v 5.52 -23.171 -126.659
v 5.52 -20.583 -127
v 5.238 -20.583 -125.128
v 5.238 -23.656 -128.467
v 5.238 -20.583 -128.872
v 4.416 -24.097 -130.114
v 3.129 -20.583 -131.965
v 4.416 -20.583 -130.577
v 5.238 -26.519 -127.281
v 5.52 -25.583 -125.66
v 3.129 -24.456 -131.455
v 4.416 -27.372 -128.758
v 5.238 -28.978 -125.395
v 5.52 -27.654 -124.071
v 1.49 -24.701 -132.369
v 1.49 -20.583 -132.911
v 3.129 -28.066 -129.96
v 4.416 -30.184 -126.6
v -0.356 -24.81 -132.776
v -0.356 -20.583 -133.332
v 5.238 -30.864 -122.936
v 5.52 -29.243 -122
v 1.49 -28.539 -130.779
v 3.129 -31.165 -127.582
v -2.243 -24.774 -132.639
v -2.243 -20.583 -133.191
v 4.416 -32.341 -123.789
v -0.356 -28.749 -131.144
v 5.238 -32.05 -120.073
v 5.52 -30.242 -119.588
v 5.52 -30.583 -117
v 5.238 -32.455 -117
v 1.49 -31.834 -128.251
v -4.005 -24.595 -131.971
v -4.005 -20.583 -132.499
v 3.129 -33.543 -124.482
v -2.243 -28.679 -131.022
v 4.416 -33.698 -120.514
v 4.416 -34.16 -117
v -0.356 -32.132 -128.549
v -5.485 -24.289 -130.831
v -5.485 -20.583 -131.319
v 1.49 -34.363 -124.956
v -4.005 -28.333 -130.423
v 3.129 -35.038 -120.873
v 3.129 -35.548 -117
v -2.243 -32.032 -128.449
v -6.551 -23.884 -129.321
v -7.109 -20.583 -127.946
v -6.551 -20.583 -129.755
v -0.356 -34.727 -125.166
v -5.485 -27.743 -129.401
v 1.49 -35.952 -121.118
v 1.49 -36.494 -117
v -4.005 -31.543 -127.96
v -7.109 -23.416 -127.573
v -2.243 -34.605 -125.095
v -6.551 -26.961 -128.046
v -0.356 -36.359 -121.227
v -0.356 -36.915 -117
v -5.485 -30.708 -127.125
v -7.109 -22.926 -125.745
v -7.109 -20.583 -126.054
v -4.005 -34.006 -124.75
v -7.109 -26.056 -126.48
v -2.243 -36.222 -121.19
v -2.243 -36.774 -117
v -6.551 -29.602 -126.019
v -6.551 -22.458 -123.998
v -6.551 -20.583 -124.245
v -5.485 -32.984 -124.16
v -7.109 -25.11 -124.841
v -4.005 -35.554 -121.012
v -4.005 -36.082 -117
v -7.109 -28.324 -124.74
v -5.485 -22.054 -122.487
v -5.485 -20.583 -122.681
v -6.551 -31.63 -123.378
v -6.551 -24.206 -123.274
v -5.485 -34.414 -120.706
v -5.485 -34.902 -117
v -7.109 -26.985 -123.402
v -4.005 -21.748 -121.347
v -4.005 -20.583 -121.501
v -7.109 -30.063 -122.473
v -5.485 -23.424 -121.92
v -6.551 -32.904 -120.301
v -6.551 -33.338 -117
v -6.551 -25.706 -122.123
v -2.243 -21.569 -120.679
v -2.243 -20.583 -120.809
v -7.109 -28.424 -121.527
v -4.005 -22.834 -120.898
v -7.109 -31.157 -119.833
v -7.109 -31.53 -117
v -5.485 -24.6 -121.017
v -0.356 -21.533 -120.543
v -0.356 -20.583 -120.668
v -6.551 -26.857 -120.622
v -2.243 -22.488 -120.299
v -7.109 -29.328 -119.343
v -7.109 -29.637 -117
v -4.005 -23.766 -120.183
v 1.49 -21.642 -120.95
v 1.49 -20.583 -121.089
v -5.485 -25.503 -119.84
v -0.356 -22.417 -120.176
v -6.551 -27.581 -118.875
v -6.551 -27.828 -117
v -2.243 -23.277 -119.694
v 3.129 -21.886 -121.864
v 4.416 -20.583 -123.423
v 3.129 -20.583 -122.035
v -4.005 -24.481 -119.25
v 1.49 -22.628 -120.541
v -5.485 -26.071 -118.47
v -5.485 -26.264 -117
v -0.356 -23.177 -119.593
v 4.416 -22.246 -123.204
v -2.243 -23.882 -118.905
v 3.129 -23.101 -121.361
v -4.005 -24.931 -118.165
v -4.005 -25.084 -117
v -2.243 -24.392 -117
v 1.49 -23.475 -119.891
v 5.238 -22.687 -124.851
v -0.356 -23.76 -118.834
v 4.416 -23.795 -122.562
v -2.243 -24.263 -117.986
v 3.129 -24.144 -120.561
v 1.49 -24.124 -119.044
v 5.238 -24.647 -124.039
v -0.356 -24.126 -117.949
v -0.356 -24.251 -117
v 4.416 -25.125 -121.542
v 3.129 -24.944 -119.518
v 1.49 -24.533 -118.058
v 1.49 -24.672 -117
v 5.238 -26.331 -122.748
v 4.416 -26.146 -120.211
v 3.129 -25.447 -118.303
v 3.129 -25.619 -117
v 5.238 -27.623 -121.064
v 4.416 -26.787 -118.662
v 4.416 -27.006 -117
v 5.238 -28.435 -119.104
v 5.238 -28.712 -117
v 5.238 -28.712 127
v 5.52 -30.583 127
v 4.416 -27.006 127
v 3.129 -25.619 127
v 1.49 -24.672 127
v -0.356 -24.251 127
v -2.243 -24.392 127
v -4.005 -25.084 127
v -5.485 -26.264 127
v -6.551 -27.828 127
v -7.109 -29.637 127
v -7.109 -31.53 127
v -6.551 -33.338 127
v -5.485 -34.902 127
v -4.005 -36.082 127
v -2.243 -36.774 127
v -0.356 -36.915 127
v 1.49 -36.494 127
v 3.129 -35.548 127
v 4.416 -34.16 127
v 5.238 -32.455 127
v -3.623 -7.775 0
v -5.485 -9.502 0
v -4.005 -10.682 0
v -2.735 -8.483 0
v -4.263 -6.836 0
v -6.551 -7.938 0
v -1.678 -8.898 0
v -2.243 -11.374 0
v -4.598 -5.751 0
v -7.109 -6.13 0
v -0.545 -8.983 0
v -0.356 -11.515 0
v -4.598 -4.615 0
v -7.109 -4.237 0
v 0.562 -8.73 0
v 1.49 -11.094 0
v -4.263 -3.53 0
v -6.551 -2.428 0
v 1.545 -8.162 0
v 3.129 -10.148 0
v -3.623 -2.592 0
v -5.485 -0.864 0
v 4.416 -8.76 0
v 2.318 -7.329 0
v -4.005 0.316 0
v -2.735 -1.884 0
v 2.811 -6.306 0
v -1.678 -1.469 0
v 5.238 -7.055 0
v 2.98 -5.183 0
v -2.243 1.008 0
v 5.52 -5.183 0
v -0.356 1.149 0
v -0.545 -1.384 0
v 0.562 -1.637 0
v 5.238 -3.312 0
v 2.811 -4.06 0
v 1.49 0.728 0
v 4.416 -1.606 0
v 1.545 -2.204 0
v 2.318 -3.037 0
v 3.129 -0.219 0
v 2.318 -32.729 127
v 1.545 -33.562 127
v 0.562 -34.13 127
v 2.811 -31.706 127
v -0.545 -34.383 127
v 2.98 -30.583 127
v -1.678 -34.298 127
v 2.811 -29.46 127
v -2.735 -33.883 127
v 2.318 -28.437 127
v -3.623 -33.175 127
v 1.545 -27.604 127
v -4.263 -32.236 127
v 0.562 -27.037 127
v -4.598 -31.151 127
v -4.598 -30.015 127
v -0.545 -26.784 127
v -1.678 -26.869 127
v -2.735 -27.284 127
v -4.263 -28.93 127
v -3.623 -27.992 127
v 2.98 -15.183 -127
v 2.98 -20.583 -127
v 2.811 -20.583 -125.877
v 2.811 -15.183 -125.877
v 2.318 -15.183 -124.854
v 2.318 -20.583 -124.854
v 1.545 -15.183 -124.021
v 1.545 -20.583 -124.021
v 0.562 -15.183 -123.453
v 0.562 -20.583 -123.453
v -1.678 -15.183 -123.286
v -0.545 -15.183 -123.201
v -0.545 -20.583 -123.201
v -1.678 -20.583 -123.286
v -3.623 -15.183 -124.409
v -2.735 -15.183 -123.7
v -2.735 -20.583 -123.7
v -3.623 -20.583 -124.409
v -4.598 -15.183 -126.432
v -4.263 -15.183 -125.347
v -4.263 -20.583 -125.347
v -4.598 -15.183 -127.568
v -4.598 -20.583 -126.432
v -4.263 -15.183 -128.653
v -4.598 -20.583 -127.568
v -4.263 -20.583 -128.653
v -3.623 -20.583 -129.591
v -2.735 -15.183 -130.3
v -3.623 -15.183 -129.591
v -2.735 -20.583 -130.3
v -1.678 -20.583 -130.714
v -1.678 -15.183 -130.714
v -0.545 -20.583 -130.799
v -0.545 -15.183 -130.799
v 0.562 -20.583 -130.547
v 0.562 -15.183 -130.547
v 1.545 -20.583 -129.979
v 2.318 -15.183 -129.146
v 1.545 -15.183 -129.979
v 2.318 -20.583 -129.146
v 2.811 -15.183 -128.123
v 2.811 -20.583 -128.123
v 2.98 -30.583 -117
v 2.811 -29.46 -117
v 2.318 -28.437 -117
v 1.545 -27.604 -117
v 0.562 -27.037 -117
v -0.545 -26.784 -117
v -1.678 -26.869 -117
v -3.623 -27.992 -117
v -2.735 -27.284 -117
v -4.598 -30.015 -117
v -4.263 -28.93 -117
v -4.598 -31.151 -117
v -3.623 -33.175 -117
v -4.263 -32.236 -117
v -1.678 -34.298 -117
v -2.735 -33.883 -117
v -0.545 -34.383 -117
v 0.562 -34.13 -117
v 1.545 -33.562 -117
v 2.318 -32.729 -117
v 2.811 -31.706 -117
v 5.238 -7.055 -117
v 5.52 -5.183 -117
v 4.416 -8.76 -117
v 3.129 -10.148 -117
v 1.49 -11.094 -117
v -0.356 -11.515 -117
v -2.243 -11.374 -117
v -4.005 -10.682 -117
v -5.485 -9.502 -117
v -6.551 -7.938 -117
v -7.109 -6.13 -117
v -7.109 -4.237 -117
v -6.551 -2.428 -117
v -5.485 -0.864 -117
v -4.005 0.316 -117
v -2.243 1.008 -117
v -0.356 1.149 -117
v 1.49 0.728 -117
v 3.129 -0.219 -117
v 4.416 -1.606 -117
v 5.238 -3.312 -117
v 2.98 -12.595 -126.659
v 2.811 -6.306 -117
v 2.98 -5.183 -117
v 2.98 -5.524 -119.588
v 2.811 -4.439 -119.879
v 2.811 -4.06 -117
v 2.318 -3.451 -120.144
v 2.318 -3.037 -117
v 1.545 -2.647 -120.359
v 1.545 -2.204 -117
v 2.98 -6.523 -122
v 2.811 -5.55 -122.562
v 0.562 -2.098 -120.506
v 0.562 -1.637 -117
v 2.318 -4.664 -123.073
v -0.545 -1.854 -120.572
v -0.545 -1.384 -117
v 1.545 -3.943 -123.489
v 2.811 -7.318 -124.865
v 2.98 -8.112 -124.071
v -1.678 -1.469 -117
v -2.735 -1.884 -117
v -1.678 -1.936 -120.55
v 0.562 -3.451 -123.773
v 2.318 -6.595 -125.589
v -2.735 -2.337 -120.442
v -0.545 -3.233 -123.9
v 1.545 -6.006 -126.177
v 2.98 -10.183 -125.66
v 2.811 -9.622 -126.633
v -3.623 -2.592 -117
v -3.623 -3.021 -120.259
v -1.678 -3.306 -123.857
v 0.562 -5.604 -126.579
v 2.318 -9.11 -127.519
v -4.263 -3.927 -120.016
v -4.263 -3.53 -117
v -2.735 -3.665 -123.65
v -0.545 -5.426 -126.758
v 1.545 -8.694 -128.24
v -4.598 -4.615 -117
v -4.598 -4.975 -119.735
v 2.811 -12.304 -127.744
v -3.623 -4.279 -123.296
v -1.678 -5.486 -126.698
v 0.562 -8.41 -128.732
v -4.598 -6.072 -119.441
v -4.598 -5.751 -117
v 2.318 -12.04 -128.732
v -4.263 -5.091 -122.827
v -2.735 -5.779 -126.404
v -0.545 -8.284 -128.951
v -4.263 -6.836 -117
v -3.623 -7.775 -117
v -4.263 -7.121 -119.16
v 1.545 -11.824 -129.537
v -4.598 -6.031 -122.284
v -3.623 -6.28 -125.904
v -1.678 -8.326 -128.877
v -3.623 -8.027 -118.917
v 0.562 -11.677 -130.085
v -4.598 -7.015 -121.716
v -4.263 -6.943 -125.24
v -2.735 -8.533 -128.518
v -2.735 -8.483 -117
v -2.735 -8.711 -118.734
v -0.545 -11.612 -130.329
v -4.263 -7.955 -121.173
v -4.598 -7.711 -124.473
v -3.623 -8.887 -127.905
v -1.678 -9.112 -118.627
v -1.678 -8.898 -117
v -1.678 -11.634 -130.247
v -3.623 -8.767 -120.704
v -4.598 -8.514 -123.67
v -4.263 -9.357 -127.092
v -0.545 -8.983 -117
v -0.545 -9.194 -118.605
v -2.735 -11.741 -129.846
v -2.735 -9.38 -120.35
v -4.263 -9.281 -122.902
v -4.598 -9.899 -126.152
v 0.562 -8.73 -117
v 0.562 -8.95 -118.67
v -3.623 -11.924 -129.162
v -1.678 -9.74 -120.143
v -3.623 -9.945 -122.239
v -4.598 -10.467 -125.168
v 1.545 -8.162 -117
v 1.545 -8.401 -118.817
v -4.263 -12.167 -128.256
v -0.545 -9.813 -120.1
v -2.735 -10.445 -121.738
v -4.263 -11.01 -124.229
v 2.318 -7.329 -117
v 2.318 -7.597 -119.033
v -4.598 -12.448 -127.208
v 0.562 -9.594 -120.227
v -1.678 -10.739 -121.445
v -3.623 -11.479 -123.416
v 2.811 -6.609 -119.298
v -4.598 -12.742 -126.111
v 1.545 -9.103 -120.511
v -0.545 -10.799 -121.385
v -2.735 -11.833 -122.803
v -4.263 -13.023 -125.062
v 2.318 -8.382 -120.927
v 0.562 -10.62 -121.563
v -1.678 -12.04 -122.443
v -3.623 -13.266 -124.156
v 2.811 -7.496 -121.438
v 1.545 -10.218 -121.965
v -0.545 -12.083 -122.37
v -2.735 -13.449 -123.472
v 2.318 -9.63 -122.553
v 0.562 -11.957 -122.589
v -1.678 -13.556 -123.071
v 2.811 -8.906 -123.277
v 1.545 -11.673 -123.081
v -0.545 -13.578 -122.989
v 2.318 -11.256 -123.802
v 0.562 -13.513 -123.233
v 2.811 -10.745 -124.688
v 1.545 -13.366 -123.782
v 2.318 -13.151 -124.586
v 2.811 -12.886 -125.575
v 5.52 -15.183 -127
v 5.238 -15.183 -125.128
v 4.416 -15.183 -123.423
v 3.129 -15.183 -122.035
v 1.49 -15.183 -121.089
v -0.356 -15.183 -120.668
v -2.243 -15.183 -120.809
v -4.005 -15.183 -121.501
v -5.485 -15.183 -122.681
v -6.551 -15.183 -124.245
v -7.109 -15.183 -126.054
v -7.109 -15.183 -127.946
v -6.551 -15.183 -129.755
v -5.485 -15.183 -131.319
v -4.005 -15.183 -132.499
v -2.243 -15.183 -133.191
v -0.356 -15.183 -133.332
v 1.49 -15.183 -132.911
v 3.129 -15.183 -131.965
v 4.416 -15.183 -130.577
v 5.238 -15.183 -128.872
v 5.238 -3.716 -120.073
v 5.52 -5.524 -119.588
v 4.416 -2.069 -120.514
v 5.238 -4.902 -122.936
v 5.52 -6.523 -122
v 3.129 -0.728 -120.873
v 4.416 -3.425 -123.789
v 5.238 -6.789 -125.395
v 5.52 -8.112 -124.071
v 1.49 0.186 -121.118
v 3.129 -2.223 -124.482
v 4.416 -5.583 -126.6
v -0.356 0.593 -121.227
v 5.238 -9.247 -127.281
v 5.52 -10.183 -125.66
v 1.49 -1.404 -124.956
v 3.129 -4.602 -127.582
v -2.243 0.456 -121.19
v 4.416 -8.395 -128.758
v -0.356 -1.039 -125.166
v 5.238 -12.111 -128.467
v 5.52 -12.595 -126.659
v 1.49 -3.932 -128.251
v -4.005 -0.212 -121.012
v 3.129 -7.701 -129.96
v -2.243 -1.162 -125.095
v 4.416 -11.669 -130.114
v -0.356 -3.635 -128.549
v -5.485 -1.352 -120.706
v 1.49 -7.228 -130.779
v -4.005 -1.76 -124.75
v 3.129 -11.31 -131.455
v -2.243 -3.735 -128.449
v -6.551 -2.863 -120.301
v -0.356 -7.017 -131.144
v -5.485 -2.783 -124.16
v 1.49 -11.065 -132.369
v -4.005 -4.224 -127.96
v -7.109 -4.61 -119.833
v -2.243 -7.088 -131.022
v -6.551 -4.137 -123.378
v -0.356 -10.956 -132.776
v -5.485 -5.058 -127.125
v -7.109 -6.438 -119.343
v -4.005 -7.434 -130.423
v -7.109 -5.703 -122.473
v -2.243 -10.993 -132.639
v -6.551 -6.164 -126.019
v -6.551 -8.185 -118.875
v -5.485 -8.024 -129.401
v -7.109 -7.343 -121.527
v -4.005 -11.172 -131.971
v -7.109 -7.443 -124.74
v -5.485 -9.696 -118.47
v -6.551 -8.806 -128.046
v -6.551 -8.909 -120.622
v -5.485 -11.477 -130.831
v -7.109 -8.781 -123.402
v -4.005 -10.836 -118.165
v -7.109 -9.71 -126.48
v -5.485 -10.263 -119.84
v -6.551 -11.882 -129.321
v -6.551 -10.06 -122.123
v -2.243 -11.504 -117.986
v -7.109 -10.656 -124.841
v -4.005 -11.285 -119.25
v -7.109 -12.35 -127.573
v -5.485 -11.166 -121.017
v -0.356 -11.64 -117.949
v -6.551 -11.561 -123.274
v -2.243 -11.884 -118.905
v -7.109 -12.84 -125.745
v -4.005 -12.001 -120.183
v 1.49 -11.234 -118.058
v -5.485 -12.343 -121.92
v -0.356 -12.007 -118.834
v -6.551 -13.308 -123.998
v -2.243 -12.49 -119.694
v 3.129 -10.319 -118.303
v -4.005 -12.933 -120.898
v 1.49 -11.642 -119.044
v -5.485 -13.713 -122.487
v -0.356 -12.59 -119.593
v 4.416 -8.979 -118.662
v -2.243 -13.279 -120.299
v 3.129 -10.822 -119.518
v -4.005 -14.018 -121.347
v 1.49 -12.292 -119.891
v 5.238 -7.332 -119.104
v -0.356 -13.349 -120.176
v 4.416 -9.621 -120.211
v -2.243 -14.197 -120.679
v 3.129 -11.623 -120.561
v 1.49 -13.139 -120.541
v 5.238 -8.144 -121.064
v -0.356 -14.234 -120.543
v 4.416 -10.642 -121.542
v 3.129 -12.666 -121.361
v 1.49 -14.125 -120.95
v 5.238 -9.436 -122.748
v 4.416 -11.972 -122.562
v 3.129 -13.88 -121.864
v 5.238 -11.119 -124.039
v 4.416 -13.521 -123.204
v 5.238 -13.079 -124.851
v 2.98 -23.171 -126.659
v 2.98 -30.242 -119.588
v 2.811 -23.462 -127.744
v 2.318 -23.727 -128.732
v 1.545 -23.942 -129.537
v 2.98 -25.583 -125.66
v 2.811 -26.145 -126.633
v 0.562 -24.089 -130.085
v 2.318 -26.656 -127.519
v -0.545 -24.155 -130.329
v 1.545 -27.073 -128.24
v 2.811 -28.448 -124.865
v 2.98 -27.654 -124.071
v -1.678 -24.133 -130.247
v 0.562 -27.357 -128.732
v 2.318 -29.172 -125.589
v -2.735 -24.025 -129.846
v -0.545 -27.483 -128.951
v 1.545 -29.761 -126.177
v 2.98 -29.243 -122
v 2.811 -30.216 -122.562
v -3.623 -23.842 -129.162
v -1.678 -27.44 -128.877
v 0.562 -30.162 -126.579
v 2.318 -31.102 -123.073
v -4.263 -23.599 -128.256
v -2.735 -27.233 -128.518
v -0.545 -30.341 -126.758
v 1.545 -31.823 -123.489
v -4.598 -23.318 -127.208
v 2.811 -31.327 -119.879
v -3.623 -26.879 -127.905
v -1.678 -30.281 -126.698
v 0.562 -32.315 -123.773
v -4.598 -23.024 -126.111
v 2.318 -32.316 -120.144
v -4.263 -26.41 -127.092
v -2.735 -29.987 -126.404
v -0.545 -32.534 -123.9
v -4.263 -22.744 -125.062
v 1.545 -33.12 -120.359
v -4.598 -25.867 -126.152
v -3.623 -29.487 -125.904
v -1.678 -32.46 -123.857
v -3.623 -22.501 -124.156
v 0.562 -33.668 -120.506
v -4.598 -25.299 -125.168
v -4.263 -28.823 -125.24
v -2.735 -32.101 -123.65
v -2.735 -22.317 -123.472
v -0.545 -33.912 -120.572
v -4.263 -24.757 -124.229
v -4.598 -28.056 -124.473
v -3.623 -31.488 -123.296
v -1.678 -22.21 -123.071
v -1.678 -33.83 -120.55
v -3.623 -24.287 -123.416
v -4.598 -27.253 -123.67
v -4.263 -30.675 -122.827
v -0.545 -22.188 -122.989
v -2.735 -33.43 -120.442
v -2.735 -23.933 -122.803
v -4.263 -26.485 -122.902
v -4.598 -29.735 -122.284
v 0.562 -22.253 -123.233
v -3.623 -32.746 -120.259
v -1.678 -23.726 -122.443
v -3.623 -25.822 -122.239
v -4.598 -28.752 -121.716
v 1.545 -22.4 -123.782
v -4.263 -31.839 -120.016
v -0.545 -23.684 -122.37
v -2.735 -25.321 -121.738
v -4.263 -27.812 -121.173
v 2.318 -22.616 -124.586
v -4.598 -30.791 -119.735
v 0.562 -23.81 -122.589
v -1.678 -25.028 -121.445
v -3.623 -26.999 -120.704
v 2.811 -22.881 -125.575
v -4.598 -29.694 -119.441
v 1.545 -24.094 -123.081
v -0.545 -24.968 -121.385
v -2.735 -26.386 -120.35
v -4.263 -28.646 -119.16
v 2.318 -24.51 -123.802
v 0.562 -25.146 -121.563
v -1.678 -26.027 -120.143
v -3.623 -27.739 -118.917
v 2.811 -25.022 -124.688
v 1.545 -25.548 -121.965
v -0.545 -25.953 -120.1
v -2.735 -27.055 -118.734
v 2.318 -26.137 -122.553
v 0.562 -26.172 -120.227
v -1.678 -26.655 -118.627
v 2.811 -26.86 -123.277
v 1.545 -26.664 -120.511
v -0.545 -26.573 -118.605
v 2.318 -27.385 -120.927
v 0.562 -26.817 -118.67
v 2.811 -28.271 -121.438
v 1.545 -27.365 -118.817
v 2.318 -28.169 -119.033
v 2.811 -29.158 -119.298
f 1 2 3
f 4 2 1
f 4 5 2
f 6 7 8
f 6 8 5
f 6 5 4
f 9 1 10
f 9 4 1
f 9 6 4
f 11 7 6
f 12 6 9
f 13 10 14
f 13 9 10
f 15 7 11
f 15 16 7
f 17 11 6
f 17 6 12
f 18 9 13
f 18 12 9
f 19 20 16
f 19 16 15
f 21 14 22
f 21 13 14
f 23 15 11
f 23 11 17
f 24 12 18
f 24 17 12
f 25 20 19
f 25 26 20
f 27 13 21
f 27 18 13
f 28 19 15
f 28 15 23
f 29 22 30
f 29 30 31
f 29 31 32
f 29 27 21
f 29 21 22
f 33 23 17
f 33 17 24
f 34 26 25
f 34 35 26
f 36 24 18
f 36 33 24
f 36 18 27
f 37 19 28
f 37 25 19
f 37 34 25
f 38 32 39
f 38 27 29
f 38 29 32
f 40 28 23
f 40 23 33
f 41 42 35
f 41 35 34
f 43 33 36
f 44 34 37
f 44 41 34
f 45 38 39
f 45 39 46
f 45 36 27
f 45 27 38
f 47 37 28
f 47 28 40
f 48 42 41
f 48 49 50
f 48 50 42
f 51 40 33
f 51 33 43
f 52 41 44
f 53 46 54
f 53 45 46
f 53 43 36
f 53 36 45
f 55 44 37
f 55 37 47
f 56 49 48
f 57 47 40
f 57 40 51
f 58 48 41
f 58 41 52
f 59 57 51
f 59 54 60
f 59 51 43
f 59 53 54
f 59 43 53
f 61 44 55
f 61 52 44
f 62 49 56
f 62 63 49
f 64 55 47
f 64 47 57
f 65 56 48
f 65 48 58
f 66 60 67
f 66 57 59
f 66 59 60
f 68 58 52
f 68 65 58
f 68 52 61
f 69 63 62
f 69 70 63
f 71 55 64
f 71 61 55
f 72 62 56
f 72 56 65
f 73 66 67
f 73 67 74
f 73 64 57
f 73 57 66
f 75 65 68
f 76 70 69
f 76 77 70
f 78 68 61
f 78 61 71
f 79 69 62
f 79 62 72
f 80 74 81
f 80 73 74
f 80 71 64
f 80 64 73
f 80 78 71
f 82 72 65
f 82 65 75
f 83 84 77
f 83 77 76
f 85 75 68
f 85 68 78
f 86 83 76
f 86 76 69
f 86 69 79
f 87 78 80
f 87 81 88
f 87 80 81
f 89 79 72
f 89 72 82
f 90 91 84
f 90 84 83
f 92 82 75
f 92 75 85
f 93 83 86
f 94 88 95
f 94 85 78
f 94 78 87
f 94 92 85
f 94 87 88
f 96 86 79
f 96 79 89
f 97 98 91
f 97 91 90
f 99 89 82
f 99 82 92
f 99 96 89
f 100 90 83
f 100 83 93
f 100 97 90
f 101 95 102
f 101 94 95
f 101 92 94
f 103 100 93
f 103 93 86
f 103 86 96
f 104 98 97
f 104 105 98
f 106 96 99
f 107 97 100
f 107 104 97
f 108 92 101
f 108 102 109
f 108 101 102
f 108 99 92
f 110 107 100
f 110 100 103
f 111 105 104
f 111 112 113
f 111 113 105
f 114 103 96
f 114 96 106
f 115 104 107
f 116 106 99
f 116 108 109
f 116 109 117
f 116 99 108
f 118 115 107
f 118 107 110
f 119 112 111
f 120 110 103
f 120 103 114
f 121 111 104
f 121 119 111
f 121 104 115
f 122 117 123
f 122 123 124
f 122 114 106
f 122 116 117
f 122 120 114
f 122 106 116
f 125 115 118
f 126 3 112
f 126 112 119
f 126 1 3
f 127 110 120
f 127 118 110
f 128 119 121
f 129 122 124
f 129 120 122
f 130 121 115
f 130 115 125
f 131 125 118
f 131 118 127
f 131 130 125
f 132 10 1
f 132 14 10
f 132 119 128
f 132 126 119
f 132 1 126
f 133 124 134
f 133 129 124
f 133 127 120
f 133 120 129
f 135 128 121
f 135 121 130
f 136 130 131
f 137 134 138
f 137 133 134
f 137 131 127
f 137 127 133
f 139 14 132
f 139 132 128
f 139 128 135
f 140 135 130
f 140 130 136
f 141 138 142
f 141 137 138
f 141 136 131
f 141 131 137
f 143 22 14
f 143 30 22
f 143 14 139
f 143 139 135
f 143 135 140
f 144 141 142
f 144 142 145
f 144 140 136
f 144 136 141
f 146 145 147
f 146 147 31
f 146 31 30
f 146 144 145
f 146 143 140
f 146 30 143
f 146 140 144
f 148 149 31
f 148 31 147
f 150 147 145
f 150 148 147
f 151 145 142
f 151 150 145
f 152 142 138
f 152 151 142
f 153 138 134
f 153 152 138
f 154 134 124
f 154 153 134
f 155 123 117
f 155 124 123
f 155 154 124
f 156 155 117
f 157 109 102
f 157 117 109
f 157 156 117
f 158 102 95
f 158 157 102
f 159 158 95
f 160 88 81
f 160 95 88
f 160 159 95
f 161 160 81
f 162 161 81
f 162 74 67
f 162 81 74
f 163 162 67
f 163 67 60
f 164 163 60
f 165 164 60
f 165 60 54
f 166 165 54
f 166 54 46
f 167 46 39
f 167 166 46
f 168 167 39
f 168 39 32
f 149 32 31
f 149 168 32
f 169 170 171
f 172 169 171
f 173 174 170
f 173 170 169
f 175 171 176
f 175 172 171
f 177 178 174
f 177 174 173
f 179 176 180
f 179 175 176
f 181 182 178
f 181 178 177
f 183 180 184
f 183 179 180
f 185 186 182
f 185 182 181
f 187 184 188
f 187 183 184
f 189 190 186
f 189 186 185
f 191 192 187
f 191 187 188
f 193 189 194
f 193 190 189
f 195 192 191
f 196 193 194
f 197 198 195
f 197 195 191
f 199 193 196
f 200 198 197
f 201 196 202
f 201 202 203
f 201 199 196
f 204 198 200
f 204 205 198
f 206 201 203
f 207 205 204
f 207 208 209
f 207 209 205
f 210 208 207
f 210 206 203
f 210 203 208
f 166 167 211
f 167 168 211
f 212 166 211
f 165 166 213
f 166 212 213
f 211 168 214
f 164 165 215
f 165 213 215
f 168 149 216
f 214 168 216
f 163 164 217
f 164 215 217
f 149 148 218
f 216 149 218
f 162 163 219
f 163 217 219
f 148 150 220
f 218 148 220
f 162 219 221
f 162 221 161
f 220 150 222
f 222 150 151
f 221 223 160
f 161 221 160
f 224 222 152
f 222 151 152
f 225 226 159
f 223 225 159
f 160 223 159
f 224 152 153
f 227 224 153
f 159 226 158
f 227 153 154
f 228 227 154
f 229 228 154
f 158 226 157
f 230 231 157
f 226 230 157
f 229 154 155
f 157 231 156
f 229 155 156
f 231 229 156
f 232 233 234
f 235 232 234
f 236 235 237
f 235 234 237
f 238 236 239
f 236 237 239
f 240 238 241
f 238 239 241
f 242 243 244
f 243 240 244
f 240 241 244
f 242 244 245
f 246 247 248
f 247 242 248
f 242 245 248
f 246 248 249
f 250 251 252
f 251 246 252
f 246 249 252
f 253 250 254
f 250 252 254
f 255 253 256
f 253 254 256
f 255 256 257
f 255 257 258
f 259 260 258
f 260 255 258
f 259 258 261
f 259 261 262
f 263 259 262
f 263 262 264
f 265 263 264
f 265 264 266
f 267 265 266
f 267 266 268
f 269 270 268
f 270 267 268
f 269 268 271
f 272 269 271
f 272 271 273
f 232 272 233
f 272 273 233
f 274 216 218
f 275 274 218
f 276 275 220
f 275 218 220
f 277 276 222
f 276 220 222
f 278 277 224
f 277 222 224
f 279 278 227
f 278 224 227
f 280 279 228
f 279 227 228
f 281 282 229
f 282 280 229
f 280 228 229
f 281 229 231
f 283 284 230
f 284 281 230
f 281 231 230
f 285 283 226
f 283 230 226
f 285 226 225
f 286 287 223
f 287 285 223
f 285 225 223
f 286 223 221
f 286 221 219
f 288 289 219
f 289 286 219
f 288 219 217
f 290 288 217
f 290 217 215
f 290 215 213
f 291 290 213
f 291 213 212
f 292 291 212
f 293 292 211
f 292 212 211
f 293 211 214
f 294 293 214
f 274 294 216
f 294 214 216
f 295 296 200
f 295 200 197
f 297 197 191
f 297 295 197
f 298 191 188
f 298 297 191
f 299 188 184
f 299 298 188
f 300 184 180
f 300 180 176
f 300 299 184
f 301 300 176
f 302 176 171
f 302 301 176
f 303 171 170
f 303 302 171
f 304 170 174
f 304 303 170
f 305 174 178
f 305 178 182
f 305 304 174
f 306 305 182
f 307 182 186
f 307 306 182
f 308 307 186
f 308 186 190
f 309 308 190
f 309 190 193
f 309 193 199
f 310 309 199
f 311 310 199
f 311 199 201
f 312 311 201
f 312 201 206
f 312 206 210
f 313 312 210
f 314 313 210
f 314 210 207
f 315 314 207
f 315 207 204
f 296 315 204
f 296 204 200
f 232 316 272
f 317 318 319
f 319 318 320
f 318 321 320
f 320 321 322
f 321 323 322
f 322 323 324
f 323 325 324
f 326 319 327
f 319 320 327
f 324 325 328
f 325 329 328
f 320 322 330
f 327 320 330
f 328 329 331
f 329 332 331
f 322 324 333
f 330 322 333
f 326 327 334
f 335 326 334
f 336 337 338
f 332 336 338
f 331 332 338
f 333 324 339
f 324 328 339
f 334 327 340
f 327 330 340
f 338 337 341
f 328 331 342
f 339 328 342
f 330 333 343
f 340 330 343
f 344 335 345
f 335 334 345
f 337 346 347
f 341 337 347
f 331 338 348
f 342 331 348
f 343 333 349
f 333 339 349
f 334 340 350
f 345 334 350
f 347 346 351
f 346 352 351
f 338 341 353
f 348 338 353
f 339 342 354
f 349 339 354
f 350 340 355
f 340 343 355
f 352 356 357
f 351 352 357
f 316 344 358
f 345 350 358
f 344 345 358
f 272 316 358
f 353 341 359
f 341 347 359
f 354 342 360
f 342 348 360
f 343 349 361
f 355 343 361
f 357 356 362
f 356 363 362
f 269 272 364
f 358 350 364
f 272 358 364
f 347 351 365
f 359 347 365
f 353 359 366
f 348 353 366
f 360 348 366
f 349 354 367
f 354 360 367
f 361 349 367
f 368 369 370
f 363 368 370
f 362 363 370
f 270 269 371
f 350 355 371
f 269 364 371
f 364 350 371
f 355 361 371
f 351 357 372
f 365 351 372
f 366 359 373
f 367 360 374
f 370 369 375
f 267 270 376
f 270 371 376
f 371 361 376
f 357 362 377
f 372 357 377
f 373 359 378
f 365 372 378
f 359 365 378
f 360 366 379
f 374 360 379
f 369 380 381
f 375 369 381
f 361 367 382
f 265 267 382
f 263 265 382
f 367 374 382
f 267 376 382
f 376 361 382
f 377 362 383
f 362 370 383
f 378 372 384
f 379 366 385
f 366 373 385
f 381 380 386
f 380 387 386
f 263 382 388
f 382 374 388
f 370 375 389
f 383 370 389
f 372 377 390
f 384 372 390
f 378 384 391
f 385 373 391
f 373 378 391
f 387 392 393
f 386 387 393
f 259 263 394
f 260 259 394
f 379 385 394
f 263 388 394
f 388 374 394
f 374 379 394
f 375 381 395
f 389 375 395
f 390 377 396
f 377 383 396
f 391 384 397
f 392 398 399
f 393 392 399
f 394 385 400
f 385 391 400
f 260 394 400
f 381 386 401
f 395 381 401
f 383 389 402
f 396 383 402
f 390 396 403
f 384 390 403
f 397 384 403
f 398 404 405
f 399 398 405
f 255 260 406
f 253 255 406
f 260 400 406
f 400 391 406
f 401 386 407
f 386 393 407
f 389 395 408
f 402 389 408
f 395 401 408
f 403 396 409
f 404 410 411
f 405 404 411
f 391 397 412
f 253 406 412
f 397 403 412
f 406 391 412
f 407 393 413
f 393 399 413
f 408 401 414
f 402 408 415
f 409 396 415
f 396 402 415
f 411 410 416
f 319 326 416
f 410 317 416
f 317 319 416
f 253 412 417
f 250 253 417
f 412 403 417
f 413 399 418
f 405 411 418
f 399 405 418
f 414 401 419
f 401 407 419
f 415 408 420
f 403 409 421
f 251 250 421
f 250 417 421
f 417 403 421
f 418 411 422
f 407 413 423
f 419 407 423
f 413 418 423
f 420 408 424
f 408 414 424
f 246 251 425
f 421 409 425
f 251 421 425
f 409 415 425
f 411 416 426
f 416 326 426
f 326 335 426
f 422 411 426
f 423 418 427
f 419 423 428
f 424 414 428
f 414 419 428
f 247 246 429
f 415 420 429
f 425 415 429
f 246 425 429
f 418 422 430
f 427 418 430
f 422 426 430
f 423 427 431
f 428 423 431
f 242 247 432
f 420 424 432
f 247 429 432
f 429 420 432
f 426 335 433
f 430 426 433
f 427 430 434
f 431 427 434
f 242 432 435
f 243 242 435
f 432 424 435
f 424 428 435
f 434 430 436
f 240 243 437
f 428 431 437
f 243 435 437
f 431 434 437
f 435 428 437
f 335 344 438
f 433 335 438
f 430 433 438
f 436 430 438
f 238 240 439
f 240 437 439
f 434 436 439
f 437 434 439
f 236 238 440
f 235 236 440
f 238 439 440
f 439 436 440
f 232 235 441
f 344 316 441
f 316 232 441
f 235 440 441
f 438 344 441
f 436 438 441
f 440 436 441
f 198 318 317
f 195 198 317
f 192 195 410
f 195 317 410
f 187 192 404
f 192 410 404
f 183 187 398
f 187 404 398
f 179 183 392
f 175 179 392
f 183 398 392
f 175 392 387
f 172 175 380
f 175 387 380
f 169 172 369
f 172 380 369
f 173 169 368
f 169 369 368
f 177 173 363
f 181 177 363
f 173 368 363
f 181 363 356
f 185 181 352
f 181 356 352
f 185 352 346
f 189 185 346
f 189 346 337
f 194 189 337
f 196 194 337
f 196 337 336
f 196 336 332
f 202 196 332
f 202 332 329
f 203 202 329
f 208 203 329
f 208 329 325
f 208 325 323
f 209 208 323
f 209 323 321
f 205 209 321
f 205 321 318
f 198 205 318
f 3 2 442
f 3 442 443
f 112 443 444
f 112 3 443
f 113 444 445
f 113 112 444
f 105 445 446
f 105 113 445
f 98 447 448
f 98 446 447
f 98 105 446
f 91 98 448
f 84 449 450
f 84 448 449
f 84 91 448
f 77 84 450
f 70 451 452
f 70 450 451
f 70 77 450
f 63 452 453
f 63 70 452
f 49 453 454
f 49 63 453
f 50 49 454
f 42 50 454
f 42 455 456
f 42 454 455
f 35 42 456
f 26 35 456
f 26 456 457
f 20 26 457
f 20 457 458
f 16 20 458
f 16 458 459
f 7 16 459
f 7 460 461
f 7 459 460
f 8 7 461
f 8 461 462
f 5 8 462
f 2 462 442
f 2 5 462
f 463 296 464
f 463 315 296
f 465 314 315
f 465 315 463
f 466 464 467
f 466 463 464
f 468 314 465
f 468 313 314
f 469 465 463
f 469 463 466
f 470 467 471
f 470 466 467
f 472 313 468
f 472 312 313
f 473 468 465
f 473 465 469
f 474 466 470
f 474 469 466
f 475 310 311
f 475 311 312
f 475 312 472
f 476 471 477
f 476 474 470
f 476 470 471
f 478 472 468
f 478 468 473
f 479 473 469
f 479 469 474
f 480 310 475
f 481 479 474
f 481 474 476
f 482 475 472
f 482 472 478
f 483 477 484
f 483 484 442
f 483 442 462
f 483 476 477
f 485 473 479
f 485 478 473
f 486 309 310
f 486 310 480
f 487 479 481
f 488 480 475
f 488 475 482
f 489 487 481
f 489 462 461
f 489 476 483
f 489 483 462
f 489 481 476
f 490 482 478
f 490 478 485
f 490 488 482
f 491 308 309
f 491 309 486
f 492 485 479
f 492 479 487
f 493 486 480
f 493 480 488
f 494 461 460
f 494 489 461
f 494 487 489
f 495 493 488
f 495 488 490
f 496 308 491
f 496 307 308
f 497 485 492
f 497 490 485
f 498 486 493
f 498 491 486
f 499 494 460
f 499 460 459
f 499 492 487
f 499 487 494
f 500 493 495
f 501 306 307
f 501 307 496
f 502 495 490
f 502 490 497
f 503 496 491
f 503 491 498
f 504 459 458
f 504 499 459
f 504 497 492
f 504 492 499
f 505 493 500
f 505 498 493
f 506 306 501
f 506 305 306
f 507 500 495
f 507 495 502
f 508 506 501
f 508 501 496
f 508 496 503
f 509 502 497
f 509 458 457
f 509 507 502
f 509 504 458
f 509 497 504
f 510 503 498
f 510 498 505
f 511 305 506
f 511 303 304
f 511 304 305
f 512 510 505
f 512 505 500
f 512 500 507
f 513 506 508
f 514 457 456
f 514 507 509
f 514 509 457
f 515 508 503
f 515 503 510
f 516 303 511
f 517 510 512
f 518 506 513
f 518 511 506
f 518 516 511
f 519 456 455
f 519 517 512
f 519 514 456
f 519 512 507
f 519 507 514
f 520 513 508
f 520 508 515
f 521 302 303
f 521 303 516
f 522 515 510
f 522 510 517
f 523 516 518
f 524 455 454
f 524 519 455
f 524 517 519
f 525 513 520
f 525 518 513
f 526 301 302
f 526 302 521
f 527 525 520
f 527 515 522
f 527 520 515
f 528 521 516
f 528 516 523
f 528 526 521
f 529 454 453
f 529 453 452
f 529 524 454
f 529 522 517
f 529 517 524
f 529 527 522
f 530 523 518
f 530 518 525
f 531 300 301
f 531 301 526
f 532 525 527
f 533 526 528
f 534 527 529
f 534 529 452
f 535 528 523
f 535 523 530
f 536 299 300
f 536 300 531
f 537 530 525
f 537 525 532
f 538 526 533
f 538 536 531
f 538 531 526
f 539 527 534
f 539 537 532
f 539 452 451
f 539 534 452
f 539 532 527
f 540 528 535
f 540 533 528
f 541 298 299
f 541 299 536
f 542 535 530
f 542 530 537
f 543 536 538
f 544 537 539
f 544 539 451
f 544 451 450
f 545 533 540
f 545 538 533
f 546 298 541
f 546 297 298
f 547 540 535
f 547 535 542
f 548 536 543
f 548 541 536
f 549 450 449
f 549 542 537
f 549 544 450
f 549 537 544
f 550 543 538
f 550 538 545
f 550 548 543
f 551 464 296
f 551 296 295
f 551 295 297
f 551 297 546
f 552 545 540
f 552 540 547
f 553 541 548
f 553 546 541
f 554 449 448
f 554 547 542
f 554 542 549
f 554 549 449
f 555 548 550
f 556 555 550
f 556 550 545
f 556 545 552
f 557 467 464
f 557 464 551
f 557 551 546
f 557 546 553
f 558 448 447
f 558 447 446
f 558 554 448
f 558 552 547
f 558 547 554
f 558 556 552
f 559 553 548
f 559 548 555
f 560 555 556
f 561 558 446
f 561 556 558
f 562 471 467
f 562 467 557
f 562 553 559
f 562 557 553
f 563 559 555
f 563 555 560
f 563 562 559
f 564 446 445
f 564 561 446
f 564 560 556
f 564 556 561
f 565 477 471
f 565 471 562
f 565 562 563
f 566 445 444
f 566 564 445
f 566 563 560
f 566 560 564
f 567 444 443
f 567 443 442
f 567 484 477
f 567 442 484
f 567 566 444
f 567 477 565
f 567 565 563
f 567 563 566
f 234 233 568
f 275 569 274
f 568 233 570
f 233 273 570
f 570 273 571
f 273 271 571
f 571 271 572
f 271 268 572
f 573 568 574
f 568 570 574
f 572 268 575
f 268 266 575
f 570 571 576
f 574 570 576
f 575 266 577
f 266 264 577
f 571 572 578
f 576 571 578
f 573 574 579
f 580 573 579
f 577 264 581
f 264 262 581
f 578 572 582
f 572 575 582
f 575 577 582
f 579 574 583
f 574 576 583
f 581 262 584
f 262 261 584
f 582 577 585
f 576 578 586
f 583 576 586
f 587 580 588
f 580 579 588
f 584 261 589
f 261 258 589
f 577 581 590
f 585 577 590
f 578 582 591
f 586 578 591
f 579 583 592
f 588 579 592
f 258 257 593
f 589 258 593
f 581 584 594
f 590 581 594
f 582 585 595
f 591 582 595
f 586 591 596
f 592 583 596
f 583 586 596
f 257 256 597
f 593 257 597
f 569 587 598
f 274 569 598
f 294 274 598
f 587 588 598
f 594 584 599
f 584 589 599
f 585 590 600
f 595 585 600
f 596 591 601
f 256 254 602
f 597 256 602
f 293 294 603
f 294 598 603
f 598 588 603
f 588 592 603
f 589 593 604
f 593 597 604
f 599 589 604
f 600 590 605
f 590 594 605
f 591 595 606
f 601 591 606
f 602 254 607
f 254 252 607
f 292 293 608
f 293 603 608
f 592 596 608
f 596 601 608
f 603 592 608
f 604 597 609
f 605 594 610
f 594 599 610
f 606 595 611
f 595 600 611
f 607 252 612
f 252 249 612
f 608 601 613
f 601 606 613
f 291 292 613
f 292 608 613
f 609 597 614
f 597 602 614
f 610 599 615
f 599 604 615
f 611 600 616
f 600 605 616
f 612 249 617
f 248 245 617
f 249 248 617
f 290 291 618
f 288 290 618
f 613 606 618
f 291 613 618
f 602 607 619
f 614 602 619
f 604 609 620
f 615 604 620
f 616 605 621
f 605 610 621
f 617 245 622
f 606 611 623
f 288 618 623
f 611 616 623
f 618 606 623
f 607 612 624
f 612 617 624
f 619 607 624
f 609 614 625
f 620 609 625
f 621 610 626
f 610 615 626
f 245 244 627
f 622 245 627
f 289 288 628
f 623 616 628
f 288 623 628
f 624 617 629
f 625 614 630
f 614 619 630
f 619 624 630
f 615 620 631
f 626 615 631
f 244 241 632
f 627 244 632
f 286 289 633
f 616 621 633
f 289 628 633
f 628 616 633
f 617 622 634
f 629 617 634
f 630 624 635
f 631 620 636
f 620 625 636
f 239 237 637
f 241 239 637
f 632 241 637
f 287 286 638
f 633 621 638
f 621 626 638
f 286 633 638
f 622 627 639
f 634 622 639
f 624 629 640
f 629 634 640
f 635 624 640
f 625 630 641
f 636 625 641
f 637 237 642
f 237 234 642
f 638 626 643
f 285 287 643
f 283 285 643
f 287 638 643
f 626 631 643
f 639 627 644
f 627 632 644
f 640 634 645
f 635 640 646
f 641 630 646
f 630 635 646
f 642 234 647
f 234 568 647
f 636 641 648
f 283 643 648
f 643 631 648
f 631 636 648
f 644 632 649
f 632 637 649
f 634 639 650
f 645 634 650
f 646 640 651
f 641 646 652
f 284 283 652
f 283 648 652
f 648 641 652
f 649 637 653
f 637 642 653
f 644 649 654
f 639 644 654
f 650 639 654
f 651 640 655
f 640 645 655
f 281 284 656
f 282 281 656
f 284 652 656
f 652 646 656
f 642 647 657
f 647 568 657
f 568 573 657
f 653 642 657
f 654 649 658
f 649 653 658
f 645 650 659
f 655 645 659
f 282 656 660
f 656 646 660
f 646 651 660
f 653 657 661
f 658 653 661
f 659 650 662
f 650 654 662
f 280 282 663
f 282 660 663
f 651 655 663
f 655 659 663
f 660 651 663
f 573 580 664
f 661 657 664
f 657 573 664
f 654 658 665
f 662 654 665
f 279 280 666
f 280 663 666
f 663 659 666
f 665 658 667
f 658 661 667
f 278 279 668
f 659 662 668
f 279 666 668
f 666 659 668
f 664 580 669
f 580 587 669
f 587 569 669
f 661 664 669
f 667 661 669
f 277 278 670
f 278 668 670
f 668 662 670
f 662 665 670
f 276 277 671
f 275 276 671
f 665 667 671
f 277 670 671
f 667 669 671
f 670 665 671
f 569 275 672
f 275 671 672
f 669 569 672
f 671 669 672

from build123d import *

# Parameters (mm, degrees)
SKETCH13_R   = 6.35
SKETCH13_R_2 = 3.81


with BuildPart() as part:
    # Sweep1: sweep along a path in Sketch14
    with BuildLine(Plane(origin=(0, 0, 0), x_dir=(0, 0, -1), z_dir=(1, 0, 0))) as sweep1_path:
        Line((0, -5.183219143), (117, -5.183219143))
        ThreePointArc((117, -5.183219143), (124.071067812, -8.112151331), (127, -15.183219143))
        Line((127, -15.183219143), (127, -20.583219143))
        ThreePointArc((127, -20.583219143), (124.071067812, -27.654286955), (117, -30.583219143))
        Line((117, -30.583219143), (-127, -30.583219143))
    # Sketch13 → Sweep1 (sweep)
    with BuildSketch(Plane.XY):
        with Locations((-0.83021259, -5.183219143)):
            Circle(SKETCH13_R)
        with Locations((-0.83021259, -5.183219143)):
            Circle(SKETCH13_R_2, mode=Mode.SUBTRACT)
    sweep(path=sweep1_path.line)


solid = part.part
